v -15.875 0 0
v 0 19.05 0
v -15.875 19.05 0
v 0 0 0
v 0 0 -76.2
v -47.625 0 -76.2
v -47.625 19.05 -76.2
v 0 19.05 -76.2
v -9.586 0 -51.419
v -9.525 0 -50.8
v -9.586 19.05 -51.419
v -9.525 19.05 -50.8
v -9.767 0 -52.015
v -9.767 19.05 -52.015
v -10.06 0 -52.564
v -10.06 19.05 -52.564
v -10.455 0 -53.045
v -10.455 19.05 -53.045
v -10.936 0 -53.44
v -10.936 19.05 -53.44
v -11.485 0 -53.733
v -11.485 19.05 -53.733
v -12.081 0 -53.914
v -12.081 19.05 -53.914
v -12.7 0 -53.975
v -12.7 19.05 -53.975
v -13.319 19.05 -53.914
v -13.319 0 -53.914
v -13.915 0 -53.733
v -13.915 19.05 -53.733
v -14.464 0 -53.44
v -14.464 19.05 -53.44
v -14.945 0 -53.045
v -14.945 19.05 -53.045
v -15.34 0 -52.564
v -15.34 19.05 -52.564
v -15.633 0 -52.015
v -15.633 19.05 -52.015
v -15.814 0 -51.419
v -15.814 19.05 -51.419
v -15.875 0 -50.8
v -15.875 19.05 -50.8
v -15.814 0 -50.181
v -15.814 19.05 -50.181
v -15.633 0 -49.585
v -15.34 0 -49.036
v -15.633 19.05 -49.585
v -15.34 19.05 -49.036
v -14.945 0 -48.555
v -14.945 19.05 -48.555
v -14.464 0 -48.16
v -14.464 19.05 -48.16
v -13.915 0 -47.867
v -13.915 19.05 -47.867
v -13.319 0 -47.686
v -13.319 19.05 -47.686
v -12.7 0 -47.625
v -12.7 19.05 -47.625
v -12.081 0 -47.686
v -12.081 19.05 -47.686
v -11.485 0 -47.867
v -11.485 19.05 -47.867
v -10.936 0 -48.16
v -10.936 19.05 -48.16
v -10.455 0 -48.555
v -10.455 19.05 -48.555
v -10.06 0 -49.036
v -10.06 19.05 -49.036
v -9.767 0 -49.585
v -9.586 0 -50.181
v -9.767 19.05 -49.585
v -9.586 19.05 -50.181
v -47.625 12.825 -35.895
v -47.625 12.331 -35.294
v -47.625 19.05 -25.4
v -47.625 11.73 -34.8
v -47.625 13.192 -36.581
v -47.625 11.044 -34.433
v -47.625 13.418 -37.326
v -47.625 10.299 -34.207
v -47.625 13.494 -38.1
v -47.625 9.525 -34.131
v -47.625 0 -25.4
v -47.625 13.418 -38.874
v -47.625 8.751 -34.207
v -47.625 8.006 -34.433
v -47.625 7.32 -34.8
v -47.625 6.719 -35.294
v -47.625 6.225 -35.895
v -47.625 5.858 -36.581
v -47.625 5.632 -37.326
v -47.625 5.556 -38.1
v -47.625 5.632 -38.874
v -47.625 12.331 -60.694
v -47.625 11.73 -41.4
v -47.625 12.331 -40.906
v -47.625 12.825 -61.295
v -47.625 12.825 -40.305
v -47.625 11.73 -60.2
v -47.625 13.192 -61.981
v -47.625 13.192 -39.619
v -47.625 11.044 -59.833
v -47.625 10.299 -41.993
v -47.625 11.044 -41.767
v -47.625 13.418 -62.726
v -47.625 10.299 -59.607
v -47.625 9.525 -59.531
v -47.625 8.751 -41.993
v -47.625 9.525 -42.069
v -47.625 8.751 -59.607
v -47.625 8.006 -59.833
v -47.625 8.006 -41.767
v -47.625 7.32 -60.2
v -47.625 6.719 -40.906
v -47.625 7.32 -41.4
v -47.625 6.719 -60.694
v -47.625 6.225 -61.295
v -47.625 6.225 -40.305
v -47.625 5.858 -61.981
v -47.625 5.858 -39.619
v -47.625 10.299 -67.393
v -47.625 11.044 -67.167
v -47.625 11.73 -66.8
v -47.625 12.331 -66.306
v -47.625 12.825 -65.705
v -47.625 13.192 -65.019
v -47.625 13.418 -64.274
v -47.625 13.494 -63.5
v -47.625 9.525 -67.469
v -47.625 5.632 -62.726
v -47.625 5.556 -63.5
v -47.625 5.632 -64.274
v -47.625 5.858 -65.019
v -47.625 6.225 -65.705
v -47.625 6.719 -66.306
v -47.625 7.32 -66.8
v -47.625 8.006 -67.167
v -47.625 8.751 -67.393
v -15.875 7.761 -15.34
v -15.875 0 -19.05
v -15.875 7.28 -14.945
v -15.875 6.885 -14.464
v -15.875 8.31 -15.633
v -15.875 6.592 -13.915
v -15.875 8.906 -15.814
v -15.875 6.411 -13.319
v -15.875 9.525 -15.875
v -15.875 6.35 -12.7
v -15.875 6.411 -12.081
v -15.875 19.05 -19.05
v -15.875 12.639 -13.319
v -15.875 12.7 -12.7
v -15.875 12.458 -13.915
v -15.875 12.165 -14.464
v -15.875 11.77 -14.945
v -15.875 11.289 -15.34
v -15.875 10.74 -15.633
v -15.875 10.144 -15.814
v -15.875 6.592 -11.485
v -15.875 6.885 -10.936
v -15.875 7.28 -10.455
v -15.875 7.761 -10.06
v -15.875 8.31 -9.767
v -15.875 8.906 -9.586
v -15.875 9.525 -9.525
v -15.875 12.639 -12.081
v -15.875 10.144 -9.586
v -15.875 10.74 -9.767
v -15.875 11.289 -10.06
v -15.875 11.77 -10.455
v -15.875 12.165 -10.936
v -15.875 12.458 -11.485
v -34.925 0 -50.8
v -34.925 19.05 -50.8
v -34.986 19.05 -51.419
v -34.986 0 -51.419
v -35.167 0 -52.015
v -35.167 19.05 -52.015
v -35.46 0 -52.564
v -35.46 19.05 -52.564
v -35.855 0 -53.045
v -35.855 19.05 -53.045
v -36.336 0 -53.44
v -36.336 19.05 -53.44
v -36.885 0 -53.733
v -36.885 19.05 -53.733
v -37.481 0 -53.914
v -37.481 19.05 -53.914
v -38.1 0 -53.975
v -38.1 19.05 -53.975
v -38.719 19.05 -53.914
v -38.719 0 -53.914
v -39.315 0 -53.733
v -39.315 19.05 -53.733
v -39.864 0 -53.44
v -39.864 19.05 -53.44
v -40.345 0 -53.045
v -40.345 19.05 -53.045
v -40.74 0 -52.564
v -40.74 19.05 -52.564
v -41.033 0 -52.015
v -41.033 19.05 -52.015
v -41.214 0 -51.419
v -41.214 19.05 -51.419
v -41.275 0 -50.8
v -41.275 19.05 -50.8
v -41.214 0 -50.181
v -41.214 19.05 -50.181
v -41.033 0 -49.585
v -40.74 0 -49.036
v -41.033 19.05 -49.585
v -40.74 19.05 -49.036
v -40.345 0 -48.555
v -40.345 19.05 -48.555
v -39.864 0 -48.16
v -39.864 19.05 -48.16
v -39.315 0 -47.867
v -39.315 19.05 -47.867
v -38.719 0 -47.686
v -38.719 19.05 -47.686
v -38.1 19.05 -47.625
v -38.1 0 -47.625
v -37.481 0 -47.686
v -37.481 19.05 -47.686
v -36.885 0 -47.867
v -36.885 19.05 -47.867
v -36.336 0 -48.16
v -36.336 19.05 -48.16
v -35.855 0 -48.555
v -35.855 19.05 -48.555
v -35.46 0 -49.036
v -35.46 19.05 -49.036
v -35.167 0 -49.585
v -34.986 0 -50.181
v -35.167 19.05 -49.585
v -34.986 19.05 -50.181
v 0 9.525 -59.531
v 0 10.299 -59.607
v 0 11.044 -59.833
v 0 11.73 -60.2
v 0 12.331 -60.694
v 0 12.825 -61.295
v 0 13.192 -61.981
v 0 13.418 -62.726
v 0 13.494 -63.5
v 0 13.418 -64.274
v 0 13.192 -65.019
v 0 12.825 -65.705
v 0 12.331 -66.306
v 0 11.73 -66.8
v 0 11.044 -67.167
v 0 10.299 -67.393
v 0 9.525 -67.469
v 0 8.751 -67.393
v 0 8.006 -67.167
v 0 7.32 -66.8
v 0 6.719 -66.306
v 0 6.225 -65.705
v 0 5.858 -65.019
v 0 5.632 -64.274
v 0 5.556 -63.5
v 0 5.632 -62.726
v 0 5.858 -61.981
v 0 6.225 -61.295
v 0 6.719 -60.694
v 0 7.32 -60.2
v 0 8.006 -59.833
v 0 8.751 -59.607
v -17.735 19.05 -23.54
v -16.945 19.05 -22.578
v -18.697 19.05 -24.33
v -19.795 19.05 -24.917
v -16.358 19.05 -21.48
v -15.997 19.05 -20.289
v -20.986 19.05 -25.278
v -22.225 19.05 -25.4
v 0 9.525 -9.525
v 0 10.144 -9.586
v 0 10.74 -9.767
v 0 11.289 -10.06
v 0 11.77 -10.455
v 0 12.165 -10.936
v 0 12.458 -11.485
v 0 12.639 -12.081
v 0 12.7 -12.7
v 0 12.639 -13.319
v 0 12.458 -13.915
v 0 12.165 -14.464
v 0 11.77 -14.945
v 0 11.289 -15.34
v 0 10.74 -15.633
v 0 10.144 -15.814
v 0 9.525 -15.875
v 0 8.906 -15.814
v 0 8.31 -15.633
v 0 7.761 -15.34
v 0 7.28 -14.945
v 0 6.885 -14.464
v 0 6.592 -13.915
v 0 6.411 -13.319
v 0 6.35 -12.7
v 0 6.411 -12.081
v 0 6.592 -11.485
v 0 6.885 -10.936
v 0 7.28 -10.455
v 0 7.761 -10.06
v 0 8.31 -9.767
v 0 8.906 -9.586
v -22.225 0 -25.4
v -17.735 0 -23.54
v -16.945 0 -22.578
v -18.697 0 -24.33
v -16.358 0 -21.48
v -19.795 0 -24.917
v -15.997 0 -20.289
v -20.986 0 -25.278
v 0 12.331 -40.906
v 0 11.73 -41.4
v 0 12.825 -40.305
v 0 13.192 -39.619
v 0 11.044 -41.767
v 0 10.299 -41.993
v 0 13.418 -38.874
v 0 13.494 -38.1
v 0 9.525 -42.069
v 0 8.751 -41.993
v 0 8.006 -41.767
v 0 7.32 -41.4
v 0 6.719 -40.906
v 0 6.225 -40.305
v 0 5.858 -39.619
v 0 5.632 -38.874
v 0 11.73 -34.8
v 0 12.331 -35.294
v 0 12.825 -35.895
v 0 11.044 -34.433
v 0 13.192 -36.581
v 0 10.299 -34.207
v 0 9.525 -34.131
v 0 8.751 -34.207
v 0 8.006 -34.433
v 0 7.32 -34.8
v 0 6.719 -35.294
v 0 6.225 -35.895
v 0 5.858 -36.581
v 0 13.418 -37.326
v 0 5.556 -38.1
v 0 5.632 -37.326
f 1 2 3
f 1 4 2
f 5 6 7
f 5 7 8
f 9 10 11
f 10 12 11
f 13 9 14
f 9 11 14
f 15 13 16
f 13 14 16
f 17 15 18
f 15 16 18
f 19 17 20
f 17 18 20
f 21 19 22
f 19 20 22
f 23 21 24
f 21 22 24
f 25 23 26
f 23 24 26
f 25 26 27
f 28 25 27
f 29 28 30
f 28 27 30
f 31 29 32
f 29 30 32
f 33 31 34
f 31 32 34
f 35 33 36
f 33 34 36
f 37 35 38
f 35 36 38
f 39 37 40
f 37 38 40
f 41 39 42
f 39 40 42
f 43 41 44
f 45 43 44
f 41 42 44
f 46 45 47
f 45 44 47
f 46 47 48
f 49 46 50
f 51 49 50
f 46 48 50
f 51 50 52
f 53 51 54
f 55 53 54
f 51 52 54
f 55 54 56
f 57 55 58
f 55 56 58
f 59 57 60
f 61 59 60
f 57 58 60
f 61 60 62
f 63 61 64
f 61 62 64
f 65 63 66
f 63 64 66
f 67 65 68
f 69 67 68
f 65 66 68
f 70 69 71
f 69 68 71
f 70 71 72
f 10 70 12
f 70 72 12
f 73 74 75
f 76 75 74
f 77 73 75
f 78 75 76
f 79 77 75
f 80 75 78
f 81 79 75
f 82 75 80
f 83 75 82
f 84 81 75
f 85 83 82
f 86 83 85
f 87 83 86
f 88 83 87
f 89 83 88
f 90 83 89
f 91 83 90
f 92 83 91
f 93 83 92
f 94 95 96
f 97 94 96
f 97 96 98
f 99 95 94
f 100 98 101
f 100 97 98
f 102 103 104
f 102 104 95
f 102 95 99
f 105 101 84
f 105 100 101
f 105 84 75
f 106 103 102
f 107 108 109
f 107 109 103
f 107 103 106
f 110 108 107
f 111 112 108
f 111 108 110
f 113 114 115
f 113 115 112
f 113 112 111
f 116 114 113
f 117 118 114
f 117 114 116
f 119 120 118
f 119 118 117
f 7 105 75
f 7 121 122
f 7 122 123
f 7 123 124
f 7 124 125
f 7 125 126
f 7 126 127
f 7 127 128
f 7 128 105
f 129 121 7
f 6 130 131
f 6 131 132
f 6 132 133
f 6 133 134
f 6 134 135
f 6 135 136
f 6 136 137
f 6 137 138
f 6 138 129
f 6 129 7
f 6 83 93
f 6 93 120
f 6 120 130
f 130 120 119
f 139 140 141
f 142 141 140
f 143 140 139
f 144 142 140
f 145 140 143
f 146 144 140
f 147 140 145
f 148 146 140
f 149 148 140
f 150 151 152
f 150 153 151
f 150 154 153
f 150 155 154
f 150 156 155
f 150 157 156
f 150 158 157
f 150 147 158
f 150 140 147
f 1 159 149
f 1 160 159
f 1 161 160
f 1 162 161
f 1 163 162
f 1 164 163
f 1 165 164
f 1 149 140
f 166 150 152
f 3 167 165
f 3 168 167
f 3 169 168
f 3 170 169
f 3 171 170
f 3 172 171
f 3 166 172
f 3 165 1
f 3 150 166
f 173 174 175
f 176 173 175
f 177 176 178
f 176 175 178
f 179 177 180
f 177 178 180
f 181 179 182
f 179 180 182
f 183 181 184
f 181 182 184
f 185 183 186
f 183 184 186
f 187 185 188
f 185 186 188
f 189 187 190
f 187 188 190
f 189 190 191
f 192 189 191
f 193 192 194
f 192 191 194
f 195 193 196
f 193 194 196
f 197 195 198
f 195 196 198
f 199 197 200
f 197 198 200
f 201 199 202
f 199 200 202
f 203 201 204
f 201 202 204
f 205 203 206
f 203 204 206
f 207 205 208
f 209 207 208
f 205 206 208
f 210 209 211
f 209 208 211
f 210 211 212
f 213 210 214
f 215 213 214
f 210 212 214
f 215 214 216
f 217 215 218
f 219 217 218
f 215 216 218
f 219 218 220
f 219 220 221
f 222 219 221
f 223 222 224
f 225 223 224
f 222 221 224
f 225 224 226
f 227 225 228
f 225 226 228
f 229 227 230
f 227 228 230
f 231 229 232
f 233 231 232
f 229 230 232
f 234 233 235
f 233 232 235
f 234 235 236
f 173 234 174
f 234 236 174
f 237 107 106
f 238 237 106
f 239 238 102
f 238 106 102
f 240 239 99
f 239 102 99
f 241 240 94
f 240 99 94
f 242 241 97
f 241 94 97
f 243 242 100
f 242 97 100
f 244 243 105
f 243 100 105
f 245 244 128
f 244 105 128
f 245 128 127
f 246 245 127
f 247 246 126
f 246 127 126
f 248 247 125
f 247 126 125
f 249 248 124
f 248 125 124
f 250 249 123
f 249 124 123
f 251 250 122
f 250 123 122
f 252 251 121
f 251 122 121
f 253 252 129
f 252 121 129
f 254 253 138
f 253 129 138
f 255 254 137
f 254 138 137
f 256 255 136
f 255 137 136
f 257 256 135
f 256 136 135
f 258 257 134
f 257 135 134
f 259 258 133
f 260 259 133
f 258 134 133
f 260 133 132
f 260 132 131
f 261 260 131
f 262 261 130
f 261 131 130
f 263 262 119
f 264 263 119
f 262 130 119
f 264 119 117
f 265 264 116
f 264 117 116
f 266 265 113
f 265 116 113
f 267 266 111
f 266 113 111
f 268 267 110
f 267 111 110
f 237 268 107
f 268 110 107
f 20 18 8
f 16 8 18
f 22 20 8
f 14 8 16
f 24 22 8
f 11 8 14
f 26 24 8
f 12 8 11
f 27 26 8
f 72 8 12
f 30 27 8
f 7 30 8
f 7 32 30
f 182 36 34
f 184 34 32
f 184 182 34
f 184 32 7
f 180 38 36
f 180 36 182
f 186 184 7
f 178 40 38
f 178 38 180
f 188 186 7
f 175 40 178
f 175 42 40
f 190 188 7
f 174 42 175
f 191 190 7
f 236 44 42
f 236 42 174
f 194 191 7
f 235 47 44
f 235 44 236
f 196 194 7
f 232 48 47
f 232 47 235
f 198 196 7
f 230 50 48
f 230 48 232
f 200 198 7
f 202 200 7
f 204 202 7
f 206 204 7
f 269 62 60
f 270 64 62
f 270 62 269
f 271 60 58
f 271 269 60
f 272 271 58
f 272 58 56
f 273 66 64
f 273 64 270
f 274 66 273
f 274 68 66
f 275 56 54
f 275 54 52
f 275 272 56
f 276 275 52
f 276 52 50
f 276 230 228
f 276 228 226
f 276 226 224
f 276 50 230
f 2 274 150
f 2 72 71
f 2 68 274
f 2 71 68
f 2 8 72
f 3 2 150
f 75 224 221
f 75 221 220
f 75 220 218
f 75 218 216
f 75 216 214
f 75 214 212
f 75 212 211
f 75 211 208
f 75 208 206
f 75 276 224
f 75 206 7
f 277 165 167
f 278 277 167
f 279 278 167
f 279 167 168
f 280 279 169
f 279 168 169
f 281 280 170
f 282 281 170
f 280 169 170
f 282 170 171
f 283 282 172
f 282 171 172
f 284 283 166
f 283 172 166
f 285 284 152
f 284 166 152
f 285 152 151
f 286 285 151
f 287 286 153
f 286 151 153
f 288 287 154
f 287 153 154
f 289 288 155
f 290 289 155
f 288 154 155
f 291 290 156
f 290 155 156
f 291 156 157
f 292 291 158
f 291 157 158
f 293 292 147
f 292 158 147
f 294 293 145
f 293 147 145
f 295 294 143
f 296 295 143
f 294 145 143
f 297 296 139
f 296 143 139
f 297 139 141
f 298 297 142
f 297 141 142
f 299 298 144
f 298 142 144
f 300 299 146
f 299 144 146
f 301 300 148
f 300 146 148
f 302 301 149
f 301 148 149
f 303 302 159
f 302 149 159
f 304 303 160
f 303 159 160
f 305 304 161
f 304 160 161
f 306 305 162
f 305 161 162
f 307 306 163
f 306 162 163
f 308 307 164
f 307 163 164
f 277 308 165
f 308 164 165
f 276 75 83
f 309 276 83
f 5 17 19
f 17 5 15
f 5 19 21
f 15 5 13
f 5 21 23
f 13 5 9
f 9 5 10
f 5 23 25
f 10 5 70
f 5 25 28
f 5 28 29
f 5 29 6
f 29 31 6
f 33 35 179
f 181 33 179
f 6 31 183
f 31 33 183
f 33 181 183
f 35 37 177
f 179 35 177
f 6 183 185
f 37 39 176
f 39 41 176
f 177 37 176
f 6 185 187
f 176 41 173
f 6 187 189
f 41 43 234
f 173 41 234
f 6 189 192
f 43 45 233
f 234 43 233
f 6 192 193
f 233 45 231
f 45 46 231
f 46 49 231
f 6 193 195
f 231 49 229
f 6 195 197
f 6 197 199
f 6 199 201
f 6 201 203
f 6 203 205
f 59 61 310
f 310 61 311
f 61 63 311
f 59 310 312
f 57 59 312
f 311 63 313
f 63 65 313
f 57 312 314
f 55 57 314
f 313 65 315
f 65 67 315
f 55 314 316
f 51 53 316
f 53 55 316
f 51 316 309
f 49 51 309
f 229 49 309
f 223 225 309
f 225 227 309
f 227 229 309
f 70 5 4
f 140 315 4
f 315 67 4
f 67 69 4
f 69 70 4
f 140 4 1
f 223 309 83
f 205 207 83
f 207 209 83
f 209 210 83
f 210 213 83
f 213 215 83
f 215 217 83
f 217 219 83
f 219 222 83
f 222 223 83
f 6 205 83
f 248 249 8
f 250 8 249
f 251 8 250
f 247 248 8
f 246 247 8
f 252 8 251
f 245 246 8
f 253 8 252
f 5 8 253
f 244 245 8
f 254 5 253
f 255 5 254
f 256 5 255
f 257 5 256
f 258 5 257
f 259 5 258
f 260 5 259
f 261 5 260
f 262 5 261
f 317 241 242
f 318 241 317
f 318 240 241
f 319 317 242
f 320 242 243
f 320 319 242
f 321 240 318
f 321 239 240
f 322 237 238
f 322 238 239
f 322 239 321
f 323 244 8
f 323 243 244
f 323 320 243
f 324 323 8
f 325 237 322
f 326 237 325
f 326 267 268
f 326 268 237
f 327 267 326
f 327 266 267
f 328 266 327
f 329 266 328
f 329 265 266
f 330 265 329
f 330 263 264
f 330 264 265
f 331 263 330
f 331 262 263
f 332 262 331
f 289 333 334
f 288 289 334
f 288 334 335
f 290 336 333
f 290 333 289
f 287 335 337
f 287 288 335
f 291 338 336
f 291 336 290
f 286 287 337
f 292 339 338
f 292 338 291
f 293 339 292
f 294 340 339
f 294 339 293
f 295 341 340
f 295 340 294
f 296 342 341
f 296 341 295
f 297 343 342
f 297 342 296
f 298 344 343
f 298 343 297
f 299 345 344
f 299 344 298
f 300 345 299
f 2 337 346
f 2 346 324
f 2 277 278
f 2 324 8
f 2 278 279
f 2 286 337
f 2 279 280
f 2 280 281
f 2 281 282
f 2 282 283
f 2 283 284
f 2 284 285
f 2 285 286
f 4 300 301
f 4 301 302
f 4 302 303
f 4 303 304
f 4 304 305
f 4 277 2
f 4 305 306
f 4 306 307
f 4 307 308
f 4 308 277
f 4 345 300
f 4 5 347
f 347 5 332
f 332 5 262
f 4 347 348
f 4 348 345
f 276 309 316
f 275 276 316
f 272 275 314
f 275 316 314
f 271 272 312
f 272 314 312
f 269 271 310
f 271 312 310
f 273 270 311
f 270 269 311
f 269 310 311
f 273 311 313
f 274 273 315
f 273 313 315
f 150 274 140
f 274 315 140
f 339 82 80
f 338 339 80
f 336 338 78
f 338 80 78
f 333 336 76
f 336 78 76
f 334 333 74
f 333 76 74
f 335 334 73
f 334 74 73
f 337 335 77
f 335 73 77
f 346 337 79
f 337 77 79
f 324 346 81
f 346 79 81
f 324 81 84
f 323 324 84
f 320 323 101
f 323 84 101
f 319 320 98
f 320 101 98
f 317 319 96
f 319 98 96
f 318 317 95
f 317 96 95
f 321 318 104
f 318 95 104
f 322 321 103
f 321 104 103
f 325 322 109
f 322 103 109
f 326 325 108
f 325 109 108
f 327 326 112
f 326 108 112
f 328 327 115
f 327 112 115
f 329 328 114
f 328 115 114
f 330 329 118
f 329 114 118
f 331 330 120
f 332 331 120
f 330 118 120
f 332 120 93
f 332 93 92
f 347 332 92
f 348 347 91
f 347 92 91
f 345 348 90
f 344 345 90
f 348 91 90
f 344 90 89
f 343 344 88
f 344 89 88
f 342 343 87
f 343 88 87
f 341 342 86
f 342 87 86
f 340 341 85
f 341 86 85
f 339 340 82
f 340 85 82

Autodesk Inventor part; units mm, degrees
ref_plane "YZ Plane" through (0, 0, 0) normal (1, 0, 0) x (0, 1, 0)
ref_plane "XZ Plane" through (0, 0, 0) normal (0, 1, 0) x (-1, 0, 0)
ref_plane "XY Plane" through (0, 0, 0) normal (0, 0, 1) x (1, 0, 0)
sketch "Sketch1" plane through (0, 0, 0) normal (0, 1, 0) x (-1, 0, 0)
  line L0 (0, 0) -> (47.625, 0)
  line L1 (47.625, 0) -> (47.625, -76.2)
  line L2 (47.625, -76.2) -> (0, -76.2)
  line L3 (0, -76.2) -> (0, 0)
  dimension "d0" = 47.625
  dimension "d1" = 76.2
extrude "Extrusion1" add sketch "Sketch1" along normal blind 19.05
sketch "Sketch2" plane through (-47.625, 0, -76.2) normal (-1, 0, 0) x (0, 0, 1)
  line L0 (0, 0) -> (0, 19.05) projected
  line L1 (0, 19.05) -> (76.2, 19.05) projected
  line L2 (76.2, 0) -> (0, 0) projected
  line L3 (48.9575, 0) -> (51.7141, 0) projected
  line L4 (51.7141, 0) -> (51.7141, 9.525) projected
  line L5 (51.7141, 9.525) -> (48.9575, 9.525) projected
  line L6 (48.9575, 9.525) -> (48.9575, 0) projected
  line L7 (0, 0) -> (76.2, 0) projected
  line L8 (0, 9.525) -> (50.8, 9.525)
  line L9 (0, 9.525) -> (25.4, 9.525)
  line L10 (76.2, 0) -> (76.2, 19.05) projected
  line L11 (50.8, 9.525) -> (38.1, 9.525)
  line L12 (25.4, 9.525) -> (12.7, 9.525)
  circle A0 centre (38.1, 9.525) radius 3.9688
  circle A1 centre (12.7, 9.525) radius 3.9688
  point P0 (53.975, 9.525)
  point P1 (53.975, 0)
  dimension "d8" = 50.8
  dimension "d9" = 25.4
  dimension "d10" = 7.9375
  dimension "d11" = 7.9375
sketch "Sketch3" plane through (-47.625, 0, -76.2) normal (-1, 0, 0) x (0, 0, 1)
  line L0 (76.2, 19.05) -> (50.8, 19.05)
  line L1 (50.8, 19.05) -> (50.8, 0)
  line L2 (50.8, 0) -> (76.2, 0)
  line L3 (76.2, 0) -> (76.2, 19.05)
  point P0 (76.2, 0)
  dimension "d21" = 25.4
  dimension "d27" = 19.05
extrude "Extrusion3" cut sketch "Sketch3" against normal blind 31.75
fillet "Fillet4" radius 6.35 1 edges at (-15.875, 9.525, -25.4)
extrude "Extrusion4" cut sketch "Sketch2" against normal through all contours A1 L8 | L8 A1 | A0 L8 | L8 A0
sketch "Sketch5" plane through (-15.875, 0, -76.2) normal (-1, 0, 0) x (0, 0, 1)
  line L0 (50.8, 0) -> (50.8, 19.05) projected
  line L1 (76.2, 19.05) -> (76.2, 0) projected
  line L2 (76.2, 9.525) -> (63.5, 9.525)
  circle A0 centre (63.5, 9.525) radius 3.175
  dimension "d28" = 12.7
  dimension "d29" = 6.35
extrude "Extrusion5" cut sketch "Sketch5" along normal mid plane 44.45
sketch "Sketch7" plane through (0, 19.05, 0) normal (0, 1, 0) x (1, 0, 0)
  line L0 (-47.625, 25.4) -> (-47.625, 50.8)
  line L1 (-47.625, 50.8) -> (-38.1, 50.8)
  circle A0 centre (-38.1, 50.8) radius 3.175
  line L2 (-38.1, 50.8) -> (-12.7, 50.8)
  circle A1 centre (-12.7, 50.8) radius 3.175
  point P0 (0, 0)
  dimension "d37" = 25.4
  dimension "d38" = 9.525
  dimension "d39" = 6.35
  dimension "d40" = 25.4
  dimension "d41" = 6.35
extrude "Extrusion7" cut sketch "Sketch7" against normal blind 25.4
properties part number "34Assembly"
